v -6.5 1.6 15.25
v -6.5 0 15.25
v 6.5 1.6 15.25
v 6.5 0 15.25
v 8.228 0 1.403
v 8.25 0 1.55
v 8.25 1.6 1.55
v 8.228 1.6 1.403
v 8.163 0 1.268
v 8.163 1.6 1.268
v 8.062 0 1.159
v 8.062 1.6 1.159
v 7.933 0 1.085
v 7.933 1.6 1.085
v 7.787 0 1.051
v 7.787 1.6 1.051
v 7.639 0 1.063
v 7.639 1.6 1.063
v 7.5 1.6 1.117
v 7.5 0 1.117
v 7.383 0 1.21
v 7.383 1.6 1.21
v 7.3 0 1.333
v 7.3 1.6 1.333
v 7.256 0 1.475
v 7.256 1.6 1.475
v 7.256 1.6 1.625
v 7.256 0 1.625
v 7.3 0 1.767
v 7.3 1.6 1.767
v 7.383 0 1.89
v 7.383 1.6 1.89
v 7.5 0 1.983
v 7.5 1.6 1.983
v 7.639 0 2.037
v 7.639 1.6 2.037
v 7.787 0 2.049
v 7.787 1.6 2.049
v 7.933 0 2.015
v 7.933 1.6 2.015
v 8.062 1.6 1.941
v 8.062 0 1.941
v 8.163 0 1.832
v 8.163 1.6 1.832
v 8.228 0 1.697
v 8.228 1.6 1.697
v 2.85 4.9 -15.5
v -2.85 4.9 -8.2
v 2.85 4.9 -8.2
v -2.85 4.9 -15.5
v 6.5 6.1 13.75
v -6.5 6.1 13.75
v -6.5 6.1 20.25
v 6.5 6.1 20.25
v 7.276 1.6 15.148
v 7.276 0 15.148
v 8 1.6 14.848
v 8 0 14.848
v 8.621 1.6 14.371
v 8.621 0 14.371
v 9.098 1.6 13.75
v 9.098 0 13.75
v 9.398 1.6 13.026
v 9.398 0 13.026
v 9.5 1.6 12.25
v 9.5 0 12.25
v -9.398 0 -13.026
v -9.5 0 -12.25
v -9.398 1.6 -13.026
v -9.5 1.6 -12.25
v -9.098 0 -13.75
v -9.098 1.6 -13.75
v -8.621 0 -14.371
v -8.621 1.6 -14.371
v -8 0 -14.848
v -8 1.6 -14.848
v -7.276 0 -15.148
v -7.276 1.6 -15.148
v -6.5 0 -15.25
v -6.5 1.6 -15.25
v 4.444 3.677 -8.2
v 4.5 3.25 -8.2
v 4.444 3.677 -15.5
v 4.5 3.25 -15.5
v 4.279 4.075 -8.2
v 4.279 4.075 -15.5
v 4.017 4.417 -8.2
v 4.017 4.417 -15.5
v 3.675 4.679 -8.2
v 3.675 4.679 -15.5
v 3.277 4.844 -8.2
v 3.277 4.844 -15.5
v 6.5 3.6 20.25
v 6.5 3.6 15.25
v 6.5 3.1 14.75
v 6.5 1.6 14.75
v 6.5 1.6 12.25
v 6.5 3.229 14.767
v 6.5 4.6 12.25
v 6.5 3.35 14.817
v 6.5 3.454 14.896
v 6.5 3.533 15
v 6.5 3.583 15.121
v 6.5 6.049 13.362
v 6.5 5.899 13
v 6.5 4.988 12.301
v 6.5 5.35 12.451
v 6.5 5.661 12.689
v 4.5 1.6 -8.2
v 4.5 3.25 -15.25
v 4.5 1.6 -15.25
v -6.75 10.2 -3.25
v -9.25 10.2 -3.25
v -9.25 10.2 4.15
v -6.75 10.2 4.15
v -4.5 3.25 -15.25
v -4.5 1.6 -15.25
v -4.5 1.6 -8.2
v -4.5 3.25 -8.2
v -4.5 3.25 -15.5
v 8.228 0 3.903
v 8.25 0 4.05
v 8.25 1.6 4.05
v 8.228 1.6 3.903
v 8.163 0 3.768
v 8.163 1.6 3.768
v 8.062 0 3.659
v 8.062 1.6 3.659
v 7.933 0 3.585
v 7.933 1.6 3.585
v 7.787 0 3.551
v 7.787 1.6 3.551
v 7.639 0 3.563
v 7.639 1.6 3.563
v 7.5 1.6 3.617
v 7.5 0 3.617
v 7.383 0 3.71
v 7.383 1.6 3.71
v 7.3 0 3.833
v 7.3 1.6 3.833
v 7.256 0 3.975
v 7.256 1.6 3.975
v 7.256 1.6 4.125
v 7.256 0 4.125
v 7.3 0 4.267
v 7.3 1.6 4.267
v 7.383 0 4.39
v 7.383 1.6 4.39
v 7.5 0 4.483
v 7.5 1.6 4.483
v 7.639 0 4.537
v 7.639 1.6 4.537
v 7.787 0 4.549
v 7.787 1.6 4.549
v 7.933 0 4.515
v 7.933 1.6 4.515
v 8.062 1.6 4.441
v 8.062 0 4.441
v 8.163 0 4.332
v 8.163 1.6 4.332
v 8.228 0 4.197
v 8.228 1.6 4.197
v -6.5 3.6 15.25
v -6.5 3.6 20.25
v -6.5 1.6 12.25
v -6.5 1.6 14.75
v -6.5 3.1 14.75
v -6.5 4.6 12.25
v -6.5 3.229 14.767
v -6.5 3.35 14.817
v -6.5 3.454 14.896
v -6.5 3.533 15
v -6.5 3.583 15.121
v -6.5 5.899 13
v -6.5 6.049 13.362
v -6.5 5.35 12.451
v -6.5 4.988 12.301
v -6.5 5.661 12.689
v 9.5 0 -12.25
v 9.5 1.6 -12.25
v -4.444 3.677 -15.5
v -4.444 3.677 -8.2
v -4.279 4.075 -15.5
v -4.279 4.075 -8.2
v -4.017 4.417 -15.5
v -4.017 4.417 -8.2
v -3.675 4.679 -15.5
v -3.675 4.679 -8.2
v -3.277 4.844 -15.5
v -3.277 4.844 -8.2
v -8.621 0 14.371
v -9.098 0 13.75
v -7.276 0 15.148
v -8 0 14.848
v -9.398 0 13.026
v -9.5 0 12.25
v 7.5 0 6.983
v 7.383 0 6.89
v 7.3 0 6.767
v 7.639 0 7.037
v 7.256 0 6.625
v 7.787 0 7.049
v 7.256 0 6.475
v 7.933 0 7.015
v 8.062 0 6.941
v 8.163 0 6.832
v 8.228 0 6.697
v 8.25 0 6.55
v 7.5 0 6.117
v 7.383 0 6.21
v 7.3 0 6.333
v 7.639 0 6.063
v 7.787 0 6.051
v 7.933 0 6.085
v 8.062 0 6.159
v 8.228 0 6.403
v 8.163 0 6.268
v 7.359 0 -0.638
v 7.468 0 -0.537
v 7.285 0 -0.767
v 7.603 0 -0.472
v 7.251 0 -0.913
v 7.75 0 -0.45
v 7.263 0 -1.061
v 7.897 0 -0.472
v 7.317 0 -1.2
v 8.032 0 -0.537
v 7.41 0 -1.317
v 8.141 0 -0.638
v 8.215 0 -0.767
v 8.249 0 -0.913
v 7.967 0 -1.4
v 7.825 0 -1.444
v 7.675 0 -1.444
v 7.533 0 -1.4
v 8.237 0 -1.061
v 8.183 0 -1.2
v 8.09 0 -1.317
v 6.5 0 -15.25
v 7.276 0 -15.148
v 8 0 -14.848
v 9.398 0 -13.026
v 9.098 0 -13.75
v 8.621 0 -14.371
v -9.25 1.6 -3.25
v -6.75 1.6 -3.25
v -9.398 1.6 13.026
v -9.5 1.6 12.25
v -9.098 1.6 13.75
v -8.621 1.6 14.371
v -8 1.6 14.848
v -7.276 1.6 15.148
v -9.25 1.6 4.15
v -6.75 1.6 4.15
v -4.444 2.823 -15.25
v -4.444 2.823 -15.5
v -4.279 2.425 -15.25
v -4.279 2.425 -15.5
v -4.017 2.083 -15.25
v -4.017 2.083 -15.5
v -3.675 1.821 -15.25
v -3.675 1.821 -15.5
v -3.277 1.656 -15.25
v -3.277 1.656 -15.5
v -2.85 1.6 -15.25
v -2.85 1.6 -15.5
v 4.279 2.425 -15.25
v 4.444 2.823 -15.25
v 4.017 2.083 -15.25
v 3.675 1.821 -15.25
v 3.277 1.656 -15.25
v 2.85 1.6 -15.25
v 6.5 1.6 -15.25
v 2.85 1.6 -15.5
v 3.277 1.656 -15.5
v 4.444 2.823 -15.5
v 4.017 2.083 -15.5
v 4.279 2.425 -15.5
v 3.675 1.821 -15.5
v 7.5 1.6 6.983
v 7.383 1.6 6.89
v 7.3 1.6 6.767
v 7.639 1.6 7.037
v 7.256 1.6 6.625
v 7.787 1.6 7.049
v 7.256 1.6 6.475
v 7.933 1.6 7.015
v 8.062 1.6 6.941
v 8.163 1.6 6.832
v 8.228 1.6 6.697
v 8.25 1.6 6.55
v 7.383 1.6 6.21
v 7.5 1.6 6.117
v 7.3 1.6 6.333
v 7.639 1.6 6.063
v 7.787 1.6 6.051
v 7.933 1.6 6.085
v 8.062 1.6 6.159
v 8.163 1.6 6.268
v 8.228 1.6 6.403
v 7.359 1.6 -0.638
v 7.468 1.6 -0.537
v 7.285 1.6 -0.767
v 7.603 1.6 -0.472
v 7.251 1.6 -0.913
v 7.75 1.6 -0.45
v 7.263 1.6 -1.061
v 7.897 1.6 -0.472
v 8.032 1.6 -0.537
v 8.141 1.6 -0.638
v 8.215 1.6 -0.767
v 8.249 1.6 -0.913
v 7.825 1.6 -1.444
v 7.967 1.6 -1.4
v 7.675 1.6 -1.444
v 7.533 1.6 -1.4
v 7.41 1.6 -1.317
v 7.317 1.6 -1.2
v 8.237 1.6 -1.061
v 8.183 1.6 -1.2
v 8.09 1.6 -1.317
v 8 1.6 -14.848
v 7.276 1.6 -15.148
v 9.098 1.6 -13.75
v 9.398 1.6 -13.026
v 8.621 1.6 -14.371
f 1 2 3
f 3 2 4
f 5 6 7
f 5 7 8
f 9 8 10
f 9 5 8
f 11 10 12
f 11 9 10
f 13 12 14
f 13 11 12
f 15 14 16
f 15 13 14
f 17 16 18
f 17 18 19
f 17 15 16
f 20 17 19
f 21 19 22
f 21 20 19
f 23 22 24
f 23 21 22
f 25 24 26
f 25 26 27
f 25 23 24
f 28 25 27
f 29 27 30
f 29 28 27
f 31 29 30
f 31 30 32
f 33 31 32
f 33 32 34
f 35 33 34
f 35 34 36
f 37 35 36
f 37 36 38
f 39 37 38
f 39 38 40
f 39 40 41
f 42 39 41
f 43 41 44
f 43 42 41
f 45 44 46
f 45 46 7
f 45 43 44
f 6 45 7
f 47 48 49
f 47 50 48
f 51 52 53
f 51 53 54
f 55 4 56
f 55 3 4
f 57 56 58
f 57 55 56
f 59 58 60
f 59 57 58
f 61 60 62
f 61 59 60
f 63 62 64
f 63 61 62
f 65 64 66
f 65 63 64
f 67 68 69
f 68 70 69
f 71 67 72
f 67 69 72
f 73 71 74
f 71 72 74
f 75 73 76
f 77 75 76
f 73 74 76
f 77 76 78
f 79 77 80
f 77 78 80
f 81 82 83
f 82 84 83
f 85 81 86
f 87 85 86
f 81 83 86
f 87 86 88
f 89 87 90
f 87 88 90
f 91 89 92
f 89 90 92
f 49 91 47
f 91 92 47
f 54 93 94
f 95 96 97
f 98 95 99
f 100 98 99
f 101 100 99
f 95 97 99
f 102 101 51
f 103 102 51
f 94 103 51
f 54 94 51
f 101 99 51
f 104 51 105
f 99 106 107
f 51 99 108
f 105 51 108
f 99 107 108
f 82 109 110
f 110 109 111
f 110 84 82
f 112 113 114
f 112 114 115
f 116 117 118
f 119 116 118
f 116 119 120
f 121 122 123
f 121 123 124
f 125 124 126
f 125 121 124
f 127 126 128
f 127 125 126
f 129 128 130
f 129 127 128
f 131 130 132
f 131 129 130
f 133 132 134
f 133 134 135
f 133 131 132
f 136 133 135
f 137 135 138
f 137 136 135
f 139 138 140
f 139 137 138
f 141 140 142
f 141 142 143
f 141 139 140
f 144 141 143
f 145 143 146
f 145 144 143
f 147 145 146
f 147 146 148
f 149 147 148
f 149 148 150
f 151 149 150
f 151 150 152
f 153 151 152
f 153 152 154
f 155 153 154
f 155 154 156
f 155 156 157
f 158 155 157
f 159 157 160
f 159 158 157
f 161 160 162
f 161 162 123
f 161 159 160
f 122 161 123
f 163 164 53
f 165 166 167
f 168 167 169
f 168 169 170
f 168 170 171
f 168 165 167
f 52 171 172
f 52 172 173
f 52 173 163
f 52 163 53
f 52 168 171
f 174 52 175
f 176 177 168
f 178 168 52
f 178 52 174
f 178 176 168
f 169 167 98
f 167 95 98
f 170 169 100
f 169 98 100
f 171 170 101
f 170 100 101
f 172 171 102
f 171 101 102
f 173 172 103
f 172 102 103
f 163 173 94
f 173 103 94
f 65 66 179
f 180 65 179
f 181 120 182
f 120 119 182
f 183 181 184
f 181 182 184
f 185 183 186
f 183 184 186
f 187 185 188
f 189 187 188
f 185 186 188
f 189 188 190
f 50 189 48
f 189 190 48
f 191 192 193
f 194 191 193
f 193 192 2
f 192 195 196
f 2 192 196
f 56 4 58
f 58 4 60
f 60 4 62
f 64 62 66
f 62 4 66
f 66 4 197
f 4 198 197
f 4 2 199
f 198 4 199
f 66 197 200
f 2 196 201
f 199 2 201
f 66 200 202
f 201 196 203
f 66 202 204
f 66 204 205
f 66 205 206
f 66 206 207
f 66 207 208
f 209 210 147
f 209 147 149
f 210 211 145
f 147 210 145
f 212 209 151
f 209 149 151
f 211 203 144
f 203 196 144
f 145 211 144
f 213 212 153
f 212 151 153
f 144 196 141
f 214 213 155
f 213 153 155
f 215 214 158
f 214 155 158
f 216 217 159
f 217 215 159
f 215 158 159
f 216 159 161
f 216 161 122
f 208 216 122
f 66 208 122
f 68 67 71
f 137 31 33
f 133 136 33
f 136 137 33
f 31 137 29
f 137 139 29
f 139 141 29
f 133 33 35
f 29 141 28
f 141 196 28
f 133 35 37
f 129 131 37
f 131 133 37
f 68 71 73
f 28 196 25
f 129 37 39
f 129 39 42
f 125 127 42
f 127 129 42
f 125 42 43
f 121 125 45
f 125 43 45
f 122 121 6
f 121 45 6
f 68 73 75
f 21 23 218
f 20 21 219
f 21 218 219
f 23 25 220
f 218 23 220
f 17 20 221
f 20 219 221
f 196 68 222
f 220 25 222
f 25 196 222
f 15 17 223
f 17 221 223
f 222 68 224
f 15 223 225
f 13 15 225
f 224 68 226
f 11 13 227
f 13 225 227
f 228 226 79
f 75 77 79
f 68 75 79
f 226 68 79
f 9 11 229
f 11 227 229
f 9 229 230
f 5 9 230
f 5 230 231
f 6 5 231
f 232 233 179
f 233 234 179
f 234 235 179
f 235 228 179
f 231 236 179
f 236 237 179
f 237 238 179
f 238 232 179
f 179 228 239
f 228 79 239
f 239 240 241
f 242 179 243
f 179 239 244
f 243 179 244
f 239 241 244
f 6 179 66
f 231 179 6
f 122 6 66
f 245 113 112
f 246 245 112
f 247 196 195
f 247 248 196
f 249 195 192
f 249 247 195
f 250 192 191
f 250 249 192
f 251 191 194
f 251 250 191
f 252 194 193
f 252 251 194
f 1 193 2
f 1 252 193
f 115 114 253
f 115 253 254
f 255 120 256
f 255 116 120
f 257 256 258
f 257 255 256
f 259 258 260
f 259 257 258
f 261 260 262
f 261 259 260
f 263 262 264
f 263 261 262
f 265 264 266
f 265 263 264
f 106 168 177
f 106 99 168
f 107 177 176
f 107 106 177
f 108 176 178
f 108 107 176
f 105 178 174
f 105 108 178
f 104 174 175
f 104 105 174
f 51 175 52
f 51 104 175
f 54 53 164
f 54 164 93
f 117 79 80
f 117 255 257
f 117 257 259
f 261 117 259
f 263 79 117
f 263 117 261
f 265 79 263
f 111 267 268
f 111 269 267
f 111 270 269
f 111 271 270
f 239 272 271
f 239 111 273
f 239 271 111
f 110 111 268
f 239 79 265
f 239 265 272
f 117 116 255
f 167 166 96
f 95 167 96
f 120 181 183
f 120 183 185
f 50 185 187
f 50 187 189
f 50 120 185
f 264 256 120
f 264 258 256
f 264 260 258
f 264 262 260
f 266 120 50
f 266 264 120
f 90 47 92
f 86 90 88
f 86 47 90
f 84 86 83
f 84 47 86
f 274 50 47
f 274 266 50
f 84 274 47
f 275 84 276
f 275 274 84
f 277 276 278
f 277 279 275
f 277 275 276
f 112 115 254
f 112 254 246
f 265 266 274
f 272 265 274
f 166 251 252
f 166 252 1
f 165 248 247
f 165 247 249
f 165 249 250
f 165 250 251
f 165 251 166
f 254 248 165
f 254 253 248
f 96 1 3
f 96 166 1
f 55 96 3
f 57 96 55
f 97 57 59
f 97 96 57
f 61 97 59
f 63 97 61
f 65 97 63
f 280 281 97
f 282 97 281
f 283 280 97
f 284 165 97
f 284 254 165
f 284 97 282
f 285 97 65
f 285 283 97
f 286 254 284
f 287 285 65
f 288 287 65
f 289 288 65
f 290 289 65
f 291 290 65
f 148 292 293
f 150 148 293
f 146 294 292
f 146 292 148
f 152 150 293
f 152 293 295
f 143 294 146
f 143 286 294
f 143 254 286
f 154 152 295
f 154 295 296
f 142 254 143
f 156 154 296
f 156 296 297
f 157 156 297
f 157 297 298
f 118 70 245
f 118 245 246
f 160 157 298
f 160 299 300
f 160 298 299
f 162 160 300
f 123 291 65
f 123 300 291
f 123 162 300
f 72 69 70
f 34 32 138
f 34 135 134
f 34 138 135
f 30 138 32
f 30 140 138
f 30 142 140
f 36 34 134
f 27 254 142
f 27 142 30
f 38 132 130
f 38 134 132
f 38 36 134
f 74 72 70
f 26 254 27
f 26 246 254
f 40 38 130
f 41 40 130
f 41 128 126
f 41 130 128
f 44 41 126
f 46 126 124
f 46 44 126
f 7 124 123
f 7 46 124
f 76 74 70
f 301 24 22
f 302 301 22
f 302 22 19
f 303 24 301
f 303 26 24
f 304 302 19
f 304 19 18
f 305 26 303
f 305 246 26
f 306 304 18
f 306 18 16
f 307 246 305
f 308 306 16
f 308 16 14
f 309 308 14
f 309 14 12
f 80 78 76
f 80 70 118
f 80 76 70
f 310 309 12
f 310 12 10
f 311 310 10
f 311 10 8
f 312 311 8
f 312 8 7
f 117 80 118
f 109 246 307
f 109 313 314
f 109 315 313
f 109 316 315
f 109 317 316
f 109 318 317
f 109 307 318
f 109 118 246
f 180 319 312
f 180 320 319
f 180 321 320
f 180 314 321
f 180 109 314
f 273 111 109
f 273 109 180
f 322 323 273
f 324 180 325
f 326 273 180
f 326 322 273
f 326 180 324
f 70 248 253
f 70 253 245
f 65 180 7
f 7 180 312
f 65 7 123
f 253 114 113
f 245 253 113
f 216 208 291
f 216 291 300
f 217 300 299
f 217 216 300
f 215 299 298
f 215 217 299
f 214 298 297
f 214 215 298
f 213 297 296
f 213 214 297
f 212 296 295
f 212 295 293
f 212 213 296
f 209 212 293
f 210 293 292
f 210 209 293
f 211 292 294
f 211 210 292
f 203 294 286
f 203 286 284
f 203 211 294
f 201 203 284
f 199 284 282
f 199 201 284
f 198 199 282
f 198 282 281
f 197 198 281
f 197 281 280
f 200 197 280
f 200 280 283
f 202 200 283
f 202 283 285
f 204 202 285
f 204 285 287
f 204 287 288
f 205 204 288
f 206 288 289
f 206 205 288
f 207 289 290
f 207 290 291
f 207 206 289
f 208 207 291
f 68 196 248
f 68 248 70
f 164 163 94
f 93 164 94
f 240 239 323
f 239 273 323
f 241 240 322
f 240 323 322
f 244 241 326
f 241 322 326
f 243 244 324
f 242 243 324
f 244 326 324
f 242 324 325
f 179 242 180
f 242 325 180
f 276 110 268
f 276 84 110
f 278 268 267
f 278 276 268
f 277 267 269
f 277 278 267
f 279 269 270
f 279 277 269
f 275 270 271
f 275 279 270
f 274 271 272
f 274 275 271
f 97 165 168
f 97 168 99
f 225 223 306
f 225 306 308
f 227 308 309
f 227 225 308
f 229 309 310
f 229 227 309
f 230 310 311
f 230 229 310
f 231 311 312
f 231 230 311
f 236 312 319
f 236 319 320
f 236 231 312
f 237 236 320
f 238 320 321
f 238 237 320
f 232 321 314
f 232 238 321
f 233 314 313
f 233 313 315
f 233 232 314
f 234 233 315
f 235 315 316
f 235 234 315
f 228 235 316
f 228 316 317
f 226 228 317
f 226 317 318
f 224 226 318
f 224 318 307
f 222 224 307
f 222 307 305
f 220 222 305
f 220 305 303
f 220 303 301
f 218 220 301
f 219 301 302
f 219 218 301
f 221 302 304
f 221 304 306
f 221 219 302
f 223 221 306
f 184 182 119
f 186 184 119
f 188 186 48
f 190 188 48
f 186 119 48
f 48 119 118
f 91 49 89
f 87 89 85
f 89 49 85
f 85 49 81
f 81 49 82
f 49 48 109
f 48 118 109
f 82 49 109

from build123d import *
from OCP.BRepFilletAPI import BRepFilletAPI_MakeFillet

# Parameters (mm, degrees)
SKETCH1_W           = 19
SKETCH1_H           = 30.5
SKETCH1_R           = 0.5
PCB_DEPTH           = 1.6
PCB_FILLET_R        = 3
USB_START           = 1.6
SKETCH1_3_W         = 9
SKETCH1_3_H         = 7.05
SKETCH1_3_H_2       = 0.25
USB_C_DEPTH         = 3.3
USB_C_FILLET_R      = 1.65
POWER_START         = 1.6
SKETCH1_4_W         = 2.5
SKETCH1_4_H         = 7.4
POWER_JUMPERS_DEPTH = 8.6
UART_START          = 1.6
SKETCH1_5_W         = 13
SKETCH1_5_H         = 2.5
UART_TO_BOARD_DEPTH = 4.5
SKETCH3_W           = 13
SKETCH3_H           = 2.5
UART_PINS_DEPTH     = 5.5
UART_FILLET_R1      = 1.5
UART_FILLET_R2      = 0.5
LPATTERN1_OUTLINE_R = 0.5
LPATTERN1_DEPTH     = 1.6


# Read off the part's stored shape, not the designer's step: LPattern1
with BuildPart() as part:
    # Sketch1 → PCB (new body)
    with BuildSketch(Plane(origin=(0, 0, 0), x_dir=(1, 0, 0), z_dir=(0, 1, 0))):
        Rectangle(SKETCH1_W, SKETCH1_H)
        with Locations(Location((7.75, 0.95, 0), (0, 0, 270))):
            Circle(SKETCH1_R, mode=Mode.SUBTRACT)
    extrude(amount=PCB_DEPTH)

    # PCB Fillet
    pcb_fillet_edges = [part.edges().sort_by_distance(p)[0] for p in [
        (9.5, 0.8, -15.25),
        (9.5, 0.8, 15.25),
        (-9.5, 0.8, 15.25),
        (-9.5, 0.8, -15.25),
    ]]
    fillet(pcb_fillet_edges, radius=PCB_FILLET_R)

    # Sketch1<3> → USB C (add)
    with BuildSketch(Plane(origin=(0, 0, 0), x_dir=(1, 0, 0), z_dir=(0, 1, 0)).offset(USB_START)):
        with Locations((0, 11.725)):
            Rectangle(SKETCH1_3_W, SKETCH1_3_H)
        with Locations((0, 15.375)):
            Rectangle(SKETCH1_3_W, SKETCH1_3_H_2)
    extrude(amount=USB_C_DEPTH)

    # USB C Fillet
    usb_c_fillet_edges = [part.edges().sort_by_distance(p)[0] for p in [
        (-4.5, 4.9, -11.85),
        (-4.5, 1.6, -15.375),
        (4.5, 4.9, -11.85),
        (4.5, 1.6, -15.375),
    ]]
    fillet(usb_c_fillet_edges, radius=USB_C_FILLET_R - 0.0001)  # a hair under: the kernel refuses the full size

    # Sketch1<4> → Power Jumpers (add)
    with BuildSketch(Plane(origin=(0, 0, 0), x_dir=(1, 0, 0), z_dir=(0, 1, 0)).offset(POWER_START)):
        with Locations((-8, -0.45)):
            Rectangle(SKETCH1_4_W, SKETCH1_4_H)
    extrude(amount=POWER_JUMPERS_DEPTH)

    # Sketch1<5> → UART To Board (add)
    with BuildSketch(Plane(origin=(0, 0, 0), x_dir=(1, 0, 0), z_dir=(0, 1, 0)).offset(UART_START)):
        with Locations((0, -13.5)):
            Rectangle(SKETCH1_5_W, SKETCH1_5_H)
    extrude(amount=UART_TO_BOARD_DEPTH)

    # Sketch3 → UART Pins (add)
    with BuildSketch(Plane.XY.offset(14.75)):
        with Locations((0, 4.85)):
            Rectangle(SKETCH3_W, SKETCH3_H)
    extrude(amount=UART_PINS_DEPTH)

    # UART Fillet: one fillet with a radius per group of edges: ONE call of the kernel's fillet builder (fillet() takes one radius for all edges)
    uart_fillet_edges_1 = [part.edges().sort_by_distance(p)[0] for p in [
        (0, 6.1, 12.25),
    ]]
    uart_fillet_edges_2 = [part.edges().sort_by_distance(p)[0] for p in [
        (0, 3.6, 14.75),
    ]]
    uart_fillet = BRepFilletAPI_MakeFillet(part.part.solid().wrapped)
    for e in uart_fillet_edges_1:
        uart_fillet.Add(UART_FILLET_R1, e.wrapped)
    for e in uart_fillet_edges_2:
        uart_fillet.Add(UART_FILLET_R2, e.wrapped)
    add(Compound.cast(uart_fillet.Shape()), mode=Mode.REPLACE)

    # LPattern1 outline → LPattern1 (cut)
    with BuildSketch(Plane(origin=(0, 0, 0), x_dir=(1, 0, 0), z_dir=(0, 1, 0))):
        with Locations((7.75, -6.55)):
            Circle(LPATTERN1_OUTLINE_R)
        with Locations((7.75, -4.05)):
            Circle(LPATTERN1_OUTLINE_R)
        with Locations((7.75, -1.55)):
            Circle(LPATTERN1_OUTLINE_R)
    extrude(amount=LPATTERN1_DEPTH, mode=Mode.SUBTRACT)


solid = part.part
